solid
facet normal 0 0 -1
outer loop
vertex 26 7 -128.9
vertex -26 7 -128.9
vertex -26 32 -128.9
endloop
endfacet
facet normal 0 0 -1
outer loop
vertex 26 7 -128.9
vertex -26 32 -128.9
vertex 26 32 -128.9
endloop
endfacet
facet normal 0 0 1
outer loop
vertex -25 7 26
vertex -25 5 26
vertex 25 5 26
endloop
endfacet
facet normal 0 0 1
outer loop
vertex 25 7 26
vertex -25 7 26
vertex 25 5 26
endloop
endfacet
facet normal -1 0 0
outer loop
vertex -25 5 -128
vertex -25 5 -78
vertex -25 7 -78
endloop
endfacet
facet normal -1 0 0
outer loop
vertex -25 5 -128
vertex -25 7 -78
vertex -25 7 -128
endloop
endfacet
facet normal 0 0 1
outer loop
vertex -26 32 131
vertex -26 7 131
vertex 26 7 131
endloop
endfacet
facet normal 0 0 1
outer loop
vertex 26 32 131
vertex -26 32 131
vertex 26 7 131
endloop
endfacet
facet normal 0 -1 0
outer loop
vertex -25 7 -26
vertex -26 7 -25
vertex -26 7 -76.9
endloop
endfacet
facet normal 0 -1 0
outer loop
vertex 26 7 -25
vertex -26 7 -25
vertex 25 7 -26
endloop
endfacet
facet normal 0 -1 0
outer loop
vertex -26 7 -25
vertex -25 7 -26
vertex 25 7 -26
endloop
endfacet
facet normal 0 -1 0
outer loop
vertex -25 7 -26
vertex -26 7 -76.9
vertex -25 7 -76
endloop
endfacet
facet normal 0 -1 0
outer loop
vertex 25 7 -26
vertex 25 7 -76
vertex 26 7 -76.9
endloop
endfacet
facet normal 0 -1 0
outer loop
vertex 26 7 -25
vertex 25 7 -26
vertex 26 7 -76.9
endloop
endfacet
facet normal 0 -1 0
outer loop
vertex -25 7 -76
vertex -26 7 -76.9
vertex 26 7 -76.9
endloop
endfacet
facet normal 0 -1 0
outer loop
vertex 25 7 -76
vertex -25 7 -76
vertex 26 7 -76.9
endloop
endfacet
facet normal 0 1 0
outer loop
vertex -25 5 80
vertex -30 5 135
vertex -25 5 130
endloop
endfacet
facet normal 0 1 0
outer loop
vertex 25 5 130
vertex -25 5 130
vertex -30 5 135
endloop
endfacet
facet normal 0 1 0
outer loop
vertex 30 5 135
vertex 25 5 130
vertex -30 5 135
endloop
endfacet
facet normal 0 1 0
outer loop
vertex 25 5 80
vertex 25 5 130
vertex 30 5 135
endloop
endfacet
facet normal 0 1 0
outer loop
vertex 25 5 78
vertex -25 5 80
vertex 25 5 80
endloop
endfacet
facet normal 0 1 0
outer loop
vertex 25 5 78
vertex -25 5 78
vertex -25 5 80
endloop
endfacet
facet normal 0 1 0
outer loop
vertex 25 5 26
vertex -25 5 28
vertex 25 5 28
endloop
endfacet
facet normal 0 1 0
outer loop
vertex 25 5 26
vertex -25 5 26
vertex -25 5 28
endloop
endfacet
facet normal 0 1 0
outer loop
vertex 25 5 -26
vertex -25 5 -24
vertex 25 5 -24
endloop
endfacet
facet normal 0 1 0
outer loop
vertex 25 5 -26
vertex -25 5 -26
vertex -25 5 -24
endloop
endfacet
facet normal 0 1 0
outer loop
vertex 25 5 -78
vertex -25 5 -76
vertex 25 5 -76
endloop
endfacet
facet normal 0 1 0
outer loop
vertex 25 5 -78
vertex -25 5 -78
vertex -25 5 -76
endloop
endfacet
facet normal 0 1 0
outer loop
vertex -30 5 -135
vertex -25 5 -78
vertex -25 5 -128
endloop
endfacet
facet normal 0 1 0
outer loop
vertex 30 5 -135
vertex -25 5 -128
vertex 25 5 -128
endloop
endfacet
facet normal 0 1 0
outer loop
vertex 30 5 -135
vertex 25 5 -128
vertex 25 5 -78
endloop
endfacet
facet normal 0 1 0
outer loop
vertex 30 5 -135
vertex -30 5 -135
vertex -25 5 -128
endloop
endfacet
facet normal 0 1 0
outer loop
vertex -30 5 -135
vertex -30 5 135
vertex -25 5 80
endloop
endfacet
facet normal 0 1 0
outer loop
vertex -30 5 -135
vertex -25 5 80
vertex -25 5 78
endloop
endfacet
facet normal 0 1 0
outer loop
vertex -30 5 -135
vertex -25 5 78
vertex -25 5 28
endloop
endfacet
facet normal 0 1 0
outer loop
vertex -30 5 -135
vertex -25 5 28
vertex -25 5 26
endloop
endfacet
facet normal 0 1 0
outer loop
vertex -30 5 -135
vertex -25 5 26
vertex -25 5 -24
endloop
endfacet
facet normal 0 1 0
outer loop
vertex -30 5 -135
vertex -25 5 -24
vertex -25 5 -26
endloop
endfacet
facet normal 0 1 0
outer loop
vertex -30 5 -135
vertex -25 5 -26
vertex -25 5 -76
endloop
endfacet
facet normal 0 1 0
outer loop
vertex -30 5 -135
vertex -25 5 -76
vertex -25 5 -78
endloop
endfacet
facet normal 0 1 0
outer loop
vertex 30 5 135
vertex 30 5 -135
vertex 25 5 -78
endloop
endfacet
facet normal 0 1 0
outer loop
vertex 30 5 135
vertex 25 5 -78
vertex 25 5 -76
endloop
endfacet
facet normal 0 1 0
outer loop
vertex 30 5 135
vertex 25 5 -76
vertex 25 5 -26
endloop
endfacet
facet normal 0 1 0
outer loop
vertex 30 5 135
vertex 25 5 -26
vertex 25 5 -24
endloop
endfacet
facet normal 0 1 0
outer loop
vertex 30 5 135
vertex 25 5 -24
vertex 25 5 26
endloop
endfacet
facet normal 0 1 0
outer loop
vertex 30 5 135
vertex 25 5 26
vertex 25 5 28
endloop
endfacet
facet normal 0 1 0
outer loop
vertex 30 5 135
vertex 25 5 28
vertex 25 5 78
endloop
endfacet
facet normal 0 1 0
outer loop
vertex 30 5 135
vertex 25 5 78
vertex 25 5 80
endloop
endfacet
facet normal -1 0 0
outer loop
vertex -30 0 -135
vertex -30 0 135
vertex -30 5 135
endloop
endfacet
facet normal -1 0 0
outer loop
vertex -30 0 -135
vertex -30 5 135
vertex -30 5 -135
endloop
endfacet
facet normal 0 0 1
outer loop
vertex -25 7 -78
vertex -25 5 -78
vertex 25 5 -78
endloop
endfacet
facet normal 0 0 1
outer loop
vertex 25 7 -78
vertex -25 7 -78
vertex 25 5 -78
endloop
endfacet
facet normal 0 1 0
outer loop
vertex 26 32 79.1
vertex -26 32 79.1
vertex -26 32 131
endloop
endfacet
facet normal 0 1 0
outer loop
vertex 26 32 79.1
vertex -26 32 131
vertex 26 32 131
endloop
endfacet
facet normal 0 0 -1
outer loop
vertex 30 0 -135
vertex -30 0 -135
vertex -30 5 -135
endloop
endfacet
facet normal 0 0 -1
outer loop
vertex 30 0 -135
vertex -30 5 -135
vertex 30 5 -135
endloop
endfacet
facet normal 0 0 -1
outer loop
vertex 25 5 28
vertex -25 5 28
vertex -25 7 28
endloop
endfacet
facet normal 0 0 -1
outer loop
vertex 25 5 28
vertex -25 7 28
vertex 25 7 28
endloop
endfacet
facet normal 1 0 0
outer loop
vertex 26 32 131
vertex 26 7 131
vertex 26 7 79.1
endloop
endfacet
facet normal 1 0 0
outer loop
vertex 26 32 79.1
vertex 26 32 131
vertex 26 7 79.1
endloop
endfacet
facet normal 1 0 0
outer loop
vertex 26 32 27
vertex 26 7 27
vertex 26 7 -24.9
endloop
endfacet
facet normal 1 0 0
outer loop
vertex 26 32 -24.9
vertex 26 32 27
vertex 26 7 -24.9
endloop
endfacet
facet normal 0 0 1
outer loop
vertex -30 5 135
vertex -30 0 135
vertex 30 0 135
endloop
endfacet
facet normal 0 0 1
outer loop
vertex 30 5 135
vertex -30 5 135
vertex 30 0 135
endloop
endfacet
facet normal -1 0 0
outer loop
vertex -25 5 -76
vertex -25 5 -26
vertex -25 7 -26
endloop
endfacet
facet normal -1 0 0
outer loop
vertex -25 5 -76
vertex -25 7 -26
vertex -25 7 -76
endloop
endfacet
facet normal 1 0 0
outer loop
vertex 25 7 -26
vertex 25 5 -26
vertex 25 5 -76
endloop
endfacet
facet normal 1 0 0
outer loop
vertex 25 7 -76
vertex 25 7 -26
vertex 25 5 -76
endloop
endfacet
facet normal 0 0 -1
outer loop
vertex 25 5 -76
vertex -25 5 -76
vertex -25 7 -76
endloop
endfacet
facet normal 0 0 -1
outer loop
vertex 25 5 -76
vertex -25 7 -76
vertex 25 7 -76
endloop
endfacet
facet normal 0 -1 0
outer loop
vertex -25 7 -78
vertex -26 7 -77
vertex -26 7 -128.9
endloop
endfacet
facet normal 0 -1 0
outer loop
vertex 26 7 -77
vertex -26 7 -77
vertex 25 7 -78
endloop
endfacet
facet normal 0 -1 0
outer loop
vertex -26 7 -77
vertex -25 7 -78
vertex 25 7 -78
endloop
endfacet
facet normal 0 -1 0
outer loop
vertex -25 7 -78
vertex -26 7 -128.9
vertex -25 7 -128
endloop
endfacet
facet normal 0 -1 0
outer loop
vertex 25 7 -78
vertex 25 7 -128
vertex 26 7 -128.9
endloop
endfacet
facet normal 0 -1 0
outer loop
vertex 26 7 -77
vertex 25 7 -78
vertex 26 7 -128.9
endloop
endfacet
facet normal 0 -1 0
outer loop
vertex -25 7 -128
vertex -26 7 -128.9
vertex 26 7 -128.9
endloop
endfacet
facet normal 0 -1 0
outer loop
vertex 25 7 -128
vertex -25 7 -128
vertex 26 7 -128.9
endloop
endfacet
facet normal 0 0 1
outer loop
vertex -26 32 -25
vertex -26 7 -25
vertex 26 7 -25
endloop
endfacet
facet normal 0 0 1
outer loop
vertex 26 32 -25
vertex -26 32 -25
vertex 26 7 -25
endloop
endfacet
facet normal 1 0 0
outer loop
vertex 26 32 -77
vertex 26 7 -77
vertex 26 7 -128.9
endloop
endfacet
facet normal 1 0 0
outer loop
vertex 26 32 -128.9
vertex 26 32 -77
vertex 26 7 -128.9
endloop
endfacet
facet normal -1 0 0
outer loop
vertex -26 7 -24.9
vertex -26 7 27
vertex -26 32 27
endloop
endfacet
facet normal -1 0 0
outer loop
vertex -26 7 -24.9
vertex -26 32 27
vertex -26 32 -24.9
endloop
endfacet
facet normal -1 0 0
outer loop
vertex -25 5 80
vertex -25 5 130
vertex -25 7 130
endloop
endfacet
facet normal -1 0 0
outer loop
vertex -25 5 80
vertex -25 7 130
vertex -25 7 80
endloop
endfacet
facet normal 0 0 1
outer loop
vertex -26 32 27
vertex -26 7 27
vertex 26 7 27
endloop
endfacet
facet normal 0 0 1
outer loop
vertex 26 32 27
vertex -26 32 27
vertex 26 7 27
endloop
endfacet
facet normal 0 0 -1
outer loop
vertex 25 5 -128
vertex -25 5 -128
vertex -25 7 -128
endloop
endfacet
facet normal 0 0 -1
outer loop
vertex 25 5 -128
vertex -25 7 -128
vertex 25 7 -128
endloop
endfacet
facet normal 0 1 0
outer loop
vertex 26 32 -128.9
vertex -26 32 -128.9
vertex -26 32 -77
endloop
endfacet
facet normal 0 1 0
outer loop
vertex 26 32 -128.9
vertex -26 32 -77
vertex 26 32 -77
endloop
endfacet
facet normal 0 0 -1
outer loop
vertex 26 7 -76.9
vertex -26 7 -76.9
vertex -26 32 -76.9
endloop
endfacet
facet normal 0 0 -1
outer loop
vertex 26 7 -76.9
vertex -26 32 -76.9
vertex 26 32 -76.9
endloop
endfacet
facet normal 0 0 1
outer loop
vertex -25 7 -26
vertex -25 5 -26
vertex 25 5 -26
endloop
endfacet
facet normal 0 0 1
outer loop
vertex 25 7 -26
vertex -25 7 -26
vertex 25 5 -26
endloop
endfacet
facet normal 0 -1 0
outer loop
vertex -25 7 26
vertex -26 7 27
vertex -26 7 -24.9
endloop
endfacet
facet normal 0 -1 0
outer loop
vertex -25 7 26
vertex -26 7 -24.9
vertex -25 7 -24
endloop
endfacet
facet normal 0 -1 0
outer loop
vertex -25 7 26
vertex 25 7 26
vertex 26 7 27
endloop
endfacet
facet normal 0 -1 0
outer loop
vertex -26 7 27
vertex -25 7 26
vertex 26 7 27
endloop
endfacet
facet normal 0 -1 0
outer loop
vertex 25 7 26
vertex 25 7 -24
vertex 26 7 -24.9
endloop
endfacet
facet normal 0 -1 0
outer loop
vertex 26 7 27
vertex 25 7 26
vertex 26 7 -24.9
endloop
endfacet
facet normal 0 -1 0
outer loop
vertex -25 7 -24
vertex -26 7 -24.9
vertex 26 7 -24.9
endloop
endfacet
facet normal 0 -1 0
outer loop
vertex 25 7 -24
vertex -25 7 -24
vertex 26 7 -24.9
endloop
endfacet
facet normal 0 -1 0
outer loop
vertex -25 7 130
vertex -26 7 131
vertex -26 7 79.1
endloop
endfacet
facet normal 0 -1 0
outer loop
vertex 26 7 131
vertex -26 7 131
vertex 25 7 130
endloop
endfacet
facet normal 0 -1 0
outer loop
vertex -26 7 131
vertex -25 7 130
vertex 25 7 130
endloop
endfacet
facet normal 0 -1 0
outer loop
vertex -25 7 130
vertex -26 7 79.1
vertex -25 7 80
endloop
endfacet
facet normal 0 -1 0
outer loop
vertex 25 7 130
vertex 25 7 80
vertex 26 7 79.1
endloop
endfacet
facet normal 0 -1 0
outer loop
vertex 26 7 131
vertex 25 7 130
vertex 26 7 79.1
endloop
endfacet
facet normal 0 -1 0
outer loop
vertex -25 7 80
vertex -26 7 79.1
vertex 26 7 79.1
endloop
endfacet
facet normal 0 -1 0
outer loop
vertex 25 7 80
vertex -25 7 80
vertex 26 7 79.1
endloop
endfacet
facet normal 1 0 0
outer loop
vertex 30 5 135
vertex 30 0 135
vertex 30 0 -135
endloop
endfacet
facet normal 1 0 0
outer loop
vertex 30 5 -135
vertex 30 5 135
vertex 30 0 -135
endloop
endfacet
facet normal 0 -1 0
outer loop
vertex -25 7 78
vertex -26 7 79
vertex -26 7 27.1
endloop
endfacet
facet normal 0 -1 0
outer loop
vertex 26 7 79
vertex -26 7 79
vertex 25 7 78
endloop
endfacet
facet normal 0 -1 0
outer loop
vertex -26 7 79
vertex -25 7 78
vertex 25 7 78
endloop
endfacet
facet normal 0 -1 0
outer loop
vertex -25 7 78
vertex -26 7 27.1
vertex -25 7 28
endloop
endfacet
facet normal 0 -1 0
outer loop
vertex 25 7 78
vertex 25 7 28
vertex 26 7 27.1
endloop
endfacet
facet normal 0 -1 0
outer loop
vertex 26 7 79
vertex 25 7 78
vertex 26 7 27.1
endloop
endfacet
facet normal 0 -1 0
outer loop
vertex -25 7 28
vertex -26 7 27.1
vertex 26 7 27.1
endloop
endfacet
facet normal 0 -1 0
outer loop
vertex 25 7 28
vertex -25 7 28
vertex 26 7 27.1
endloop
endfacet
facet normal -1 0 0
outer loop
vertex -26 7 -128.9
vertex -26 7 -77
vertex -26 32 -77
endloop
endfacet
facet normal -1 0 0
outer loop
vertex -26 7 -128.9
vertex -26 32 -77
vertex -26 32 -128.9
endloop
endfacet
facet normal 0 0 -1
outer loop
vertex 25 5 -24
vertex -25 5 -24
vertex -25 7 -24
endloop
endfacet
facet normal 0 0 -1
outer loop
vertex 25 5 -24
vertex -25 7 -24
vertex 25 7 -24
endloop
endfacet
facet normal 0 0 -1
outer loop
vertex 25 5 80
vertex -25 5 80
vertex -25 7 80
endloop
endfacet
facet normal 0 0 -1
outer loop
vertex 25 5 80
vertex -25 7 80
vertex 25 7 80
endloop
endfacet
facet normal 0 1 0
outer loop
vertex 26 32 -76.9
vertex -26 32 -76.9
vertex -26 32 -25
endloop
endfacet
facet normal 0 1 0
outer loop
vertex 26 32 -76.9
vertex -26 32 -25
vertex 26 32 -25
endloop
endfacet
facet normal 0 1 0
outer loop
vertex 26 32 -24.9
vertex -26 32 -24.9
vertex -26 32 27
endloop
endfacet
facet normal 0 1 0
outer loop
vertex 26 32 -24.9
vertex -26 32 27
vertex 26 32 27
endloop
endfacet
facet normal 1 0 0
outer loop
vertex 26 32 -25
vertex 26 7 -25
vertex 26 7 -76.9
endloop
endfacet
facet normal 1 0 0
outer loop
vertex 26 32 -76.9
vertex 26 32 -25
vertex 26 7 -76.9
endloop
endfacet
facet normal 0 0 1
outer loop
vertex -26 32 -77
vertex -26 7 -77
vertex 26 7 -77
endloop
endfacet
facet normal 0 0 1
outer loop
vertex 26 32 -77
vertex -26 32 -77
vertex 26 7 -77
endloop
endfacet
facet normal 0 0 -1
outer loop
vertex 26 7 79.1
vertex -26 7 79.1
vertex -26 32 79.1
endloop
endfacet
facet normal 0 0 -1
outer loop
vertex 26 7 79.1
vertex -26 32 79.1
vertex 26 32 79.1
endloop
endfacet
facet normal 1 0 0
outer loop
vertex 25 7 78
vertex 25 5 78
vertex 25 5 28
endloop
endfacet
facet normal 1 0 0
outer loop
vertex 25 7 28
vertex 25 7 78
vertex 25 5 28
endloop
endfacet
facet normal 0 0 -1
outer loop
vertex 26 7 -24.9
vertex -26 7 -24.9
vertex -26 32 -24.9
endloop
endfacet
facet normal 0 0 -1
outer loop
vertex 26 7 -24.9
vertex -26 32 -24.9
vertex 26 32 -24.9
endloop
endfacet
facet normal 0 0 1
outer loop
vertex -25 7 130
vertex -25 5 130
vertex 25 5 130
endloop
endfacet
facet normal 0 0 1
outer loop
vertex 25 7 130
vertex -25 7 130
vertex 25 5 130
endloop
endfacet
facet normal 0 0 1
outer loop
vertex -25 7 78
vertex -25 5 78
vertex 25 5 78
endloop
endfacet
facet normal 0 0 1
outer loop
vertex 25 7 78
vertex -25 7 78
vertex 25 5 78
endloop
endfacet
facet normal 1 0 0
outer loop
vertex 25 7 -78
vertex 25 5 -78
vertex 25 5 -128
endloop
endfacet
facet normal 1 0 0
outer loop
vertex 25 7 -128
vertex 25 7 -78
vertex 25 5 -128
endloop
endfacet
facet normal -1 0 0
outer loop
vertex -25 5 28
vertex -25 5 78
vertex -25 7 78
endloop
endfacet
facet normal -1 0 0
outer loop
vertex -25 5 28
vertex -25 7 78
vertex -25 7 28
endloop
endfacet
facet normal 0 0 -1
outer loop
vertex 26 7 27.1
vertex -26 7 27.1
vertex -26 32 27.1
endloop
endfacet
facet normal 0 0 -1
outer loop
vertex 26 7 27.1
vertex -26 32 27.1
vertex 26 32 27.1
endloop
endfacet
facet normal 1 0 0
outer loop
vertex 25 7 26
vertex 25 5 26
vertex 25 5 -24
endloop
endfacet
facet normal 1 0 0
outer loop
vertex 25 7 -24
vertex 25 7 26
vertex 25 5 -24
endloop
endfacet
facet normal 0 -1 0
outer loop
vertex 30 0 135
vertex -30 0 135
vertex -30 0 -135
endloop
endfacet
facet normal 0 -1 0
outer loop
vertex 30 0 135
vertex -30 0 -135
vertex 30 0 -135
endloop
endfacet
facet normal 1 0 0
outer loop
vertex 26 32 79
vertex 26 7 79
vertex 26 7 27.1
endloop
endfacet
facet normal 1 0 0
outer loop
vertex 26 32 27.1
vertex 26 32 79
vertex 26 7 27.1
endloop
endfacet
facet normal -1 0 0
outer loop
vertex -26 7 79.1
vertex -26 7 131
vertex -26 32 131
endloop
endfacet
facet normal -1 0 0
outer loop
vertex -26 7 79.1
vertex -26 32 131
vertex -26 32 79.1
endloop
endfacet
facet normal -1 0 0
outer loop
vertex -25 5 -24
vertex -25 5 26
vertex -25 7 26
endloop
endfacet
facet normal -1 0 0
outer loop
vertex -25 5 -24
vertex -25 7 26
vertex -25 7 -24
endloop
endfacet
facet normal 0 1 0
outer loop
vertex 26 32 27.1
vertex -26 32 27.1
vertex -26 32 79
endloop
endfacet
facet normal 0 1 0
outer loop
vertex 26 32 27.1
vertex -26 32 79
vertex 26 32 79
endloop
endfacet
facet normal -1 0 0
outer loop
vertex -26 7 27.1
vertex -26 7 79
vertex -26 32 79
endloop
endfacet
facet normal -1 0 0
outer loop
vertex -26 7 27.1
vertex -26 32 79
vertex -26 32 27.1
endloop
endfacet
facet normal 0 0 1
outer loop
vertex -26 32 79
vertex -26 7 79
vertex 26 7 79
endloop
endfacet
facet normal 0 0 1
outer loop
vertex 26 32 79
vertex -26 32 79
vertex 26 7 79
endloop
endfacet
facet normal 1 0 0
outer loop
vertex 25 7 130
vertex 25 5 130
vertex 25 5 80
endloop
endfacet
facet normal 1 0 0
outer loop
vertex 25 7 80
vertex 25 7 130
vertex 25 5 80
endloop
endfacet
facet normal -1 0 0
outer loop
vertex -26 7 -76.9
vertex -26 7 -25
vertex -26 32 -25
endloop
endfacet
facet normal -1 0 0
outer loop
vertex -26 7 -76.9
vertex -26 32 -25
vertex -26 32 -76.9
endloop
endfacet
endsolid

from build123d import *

# Parameters (mm, degrees)
SKETCH1_W           = 60
SKETCH1_H           = 270
BOSS_EXTRUDE1_DEPTH = 5
SKETCH2_W           = 50
SKETCH2_H           = 50
BOSS_EXTRUDE3_DEPTH = 2
LPATTERN1_COUNT     = 5
LPATTERN1_PITCH     = 52
SKETCH3_W           = 52
SKETCH3_H           = 51.9
BOSS_EXTRUDE8_DEPTH = 25
LPATTERN5_COUNT     = 5
LPATTERN5_PITCH     = 52


with BuildPart() as part:
    # Sketch1 → Boss-Extrude1 (new body)
    with BuildSketch(Plane(origin=(0, 0, 0), x_dir=(1, 0, 0), z_dir=(0, 1, 0))):
        Rectangle(SKETCH1_W, SKETCH1_H)
    extrude(amount=BOSS_EXTRUDE1_DEPTH)

    # Sketch2 → Boss-Extrude3 (add)
    with BuildSketch(Plane(origin=(0, 5, 0), x_dir=(1, 0, 0), z_dir=(0, 1, 0))):
        with Locations((0, -105)):
            Rectangle(SKETCH2_W, SKETCH2_H)
    boss_extrude3 = extrude(amount=BOSS_EXTRUDE3_DEPTH)

    # LPattern1: Boss-Extrude3 ×5
    with Locations(*[(0, 0, -i * LPATTERN1_PITCH) for i in range(1, LPATTERN1_COUNT)]):
        add(boss_extrude3)

    # Sketch3 → Boss-Extrude8 (add)
    with BuildSketch(Plane(origin=(0, 7, 0), x_dir=(1, 0, 0), z_dir=(0, 1, 0))):
        with Locations((0, -105.05)):
            Rectangle(SKETCH3_W, SKETCH3_H)
    boss_extrude8 = extrude(amount=BOSS_EXTRUDE8_DEPTH)

    # LPattern5: Boss-Extrude8 ×5
    with Locations(*[(0, 0, -i * LPATTERN5_PITCH) for i in range(1, LPATTERN5_COUNT)]):
        add(boss_extrude8)


solid = part.part
